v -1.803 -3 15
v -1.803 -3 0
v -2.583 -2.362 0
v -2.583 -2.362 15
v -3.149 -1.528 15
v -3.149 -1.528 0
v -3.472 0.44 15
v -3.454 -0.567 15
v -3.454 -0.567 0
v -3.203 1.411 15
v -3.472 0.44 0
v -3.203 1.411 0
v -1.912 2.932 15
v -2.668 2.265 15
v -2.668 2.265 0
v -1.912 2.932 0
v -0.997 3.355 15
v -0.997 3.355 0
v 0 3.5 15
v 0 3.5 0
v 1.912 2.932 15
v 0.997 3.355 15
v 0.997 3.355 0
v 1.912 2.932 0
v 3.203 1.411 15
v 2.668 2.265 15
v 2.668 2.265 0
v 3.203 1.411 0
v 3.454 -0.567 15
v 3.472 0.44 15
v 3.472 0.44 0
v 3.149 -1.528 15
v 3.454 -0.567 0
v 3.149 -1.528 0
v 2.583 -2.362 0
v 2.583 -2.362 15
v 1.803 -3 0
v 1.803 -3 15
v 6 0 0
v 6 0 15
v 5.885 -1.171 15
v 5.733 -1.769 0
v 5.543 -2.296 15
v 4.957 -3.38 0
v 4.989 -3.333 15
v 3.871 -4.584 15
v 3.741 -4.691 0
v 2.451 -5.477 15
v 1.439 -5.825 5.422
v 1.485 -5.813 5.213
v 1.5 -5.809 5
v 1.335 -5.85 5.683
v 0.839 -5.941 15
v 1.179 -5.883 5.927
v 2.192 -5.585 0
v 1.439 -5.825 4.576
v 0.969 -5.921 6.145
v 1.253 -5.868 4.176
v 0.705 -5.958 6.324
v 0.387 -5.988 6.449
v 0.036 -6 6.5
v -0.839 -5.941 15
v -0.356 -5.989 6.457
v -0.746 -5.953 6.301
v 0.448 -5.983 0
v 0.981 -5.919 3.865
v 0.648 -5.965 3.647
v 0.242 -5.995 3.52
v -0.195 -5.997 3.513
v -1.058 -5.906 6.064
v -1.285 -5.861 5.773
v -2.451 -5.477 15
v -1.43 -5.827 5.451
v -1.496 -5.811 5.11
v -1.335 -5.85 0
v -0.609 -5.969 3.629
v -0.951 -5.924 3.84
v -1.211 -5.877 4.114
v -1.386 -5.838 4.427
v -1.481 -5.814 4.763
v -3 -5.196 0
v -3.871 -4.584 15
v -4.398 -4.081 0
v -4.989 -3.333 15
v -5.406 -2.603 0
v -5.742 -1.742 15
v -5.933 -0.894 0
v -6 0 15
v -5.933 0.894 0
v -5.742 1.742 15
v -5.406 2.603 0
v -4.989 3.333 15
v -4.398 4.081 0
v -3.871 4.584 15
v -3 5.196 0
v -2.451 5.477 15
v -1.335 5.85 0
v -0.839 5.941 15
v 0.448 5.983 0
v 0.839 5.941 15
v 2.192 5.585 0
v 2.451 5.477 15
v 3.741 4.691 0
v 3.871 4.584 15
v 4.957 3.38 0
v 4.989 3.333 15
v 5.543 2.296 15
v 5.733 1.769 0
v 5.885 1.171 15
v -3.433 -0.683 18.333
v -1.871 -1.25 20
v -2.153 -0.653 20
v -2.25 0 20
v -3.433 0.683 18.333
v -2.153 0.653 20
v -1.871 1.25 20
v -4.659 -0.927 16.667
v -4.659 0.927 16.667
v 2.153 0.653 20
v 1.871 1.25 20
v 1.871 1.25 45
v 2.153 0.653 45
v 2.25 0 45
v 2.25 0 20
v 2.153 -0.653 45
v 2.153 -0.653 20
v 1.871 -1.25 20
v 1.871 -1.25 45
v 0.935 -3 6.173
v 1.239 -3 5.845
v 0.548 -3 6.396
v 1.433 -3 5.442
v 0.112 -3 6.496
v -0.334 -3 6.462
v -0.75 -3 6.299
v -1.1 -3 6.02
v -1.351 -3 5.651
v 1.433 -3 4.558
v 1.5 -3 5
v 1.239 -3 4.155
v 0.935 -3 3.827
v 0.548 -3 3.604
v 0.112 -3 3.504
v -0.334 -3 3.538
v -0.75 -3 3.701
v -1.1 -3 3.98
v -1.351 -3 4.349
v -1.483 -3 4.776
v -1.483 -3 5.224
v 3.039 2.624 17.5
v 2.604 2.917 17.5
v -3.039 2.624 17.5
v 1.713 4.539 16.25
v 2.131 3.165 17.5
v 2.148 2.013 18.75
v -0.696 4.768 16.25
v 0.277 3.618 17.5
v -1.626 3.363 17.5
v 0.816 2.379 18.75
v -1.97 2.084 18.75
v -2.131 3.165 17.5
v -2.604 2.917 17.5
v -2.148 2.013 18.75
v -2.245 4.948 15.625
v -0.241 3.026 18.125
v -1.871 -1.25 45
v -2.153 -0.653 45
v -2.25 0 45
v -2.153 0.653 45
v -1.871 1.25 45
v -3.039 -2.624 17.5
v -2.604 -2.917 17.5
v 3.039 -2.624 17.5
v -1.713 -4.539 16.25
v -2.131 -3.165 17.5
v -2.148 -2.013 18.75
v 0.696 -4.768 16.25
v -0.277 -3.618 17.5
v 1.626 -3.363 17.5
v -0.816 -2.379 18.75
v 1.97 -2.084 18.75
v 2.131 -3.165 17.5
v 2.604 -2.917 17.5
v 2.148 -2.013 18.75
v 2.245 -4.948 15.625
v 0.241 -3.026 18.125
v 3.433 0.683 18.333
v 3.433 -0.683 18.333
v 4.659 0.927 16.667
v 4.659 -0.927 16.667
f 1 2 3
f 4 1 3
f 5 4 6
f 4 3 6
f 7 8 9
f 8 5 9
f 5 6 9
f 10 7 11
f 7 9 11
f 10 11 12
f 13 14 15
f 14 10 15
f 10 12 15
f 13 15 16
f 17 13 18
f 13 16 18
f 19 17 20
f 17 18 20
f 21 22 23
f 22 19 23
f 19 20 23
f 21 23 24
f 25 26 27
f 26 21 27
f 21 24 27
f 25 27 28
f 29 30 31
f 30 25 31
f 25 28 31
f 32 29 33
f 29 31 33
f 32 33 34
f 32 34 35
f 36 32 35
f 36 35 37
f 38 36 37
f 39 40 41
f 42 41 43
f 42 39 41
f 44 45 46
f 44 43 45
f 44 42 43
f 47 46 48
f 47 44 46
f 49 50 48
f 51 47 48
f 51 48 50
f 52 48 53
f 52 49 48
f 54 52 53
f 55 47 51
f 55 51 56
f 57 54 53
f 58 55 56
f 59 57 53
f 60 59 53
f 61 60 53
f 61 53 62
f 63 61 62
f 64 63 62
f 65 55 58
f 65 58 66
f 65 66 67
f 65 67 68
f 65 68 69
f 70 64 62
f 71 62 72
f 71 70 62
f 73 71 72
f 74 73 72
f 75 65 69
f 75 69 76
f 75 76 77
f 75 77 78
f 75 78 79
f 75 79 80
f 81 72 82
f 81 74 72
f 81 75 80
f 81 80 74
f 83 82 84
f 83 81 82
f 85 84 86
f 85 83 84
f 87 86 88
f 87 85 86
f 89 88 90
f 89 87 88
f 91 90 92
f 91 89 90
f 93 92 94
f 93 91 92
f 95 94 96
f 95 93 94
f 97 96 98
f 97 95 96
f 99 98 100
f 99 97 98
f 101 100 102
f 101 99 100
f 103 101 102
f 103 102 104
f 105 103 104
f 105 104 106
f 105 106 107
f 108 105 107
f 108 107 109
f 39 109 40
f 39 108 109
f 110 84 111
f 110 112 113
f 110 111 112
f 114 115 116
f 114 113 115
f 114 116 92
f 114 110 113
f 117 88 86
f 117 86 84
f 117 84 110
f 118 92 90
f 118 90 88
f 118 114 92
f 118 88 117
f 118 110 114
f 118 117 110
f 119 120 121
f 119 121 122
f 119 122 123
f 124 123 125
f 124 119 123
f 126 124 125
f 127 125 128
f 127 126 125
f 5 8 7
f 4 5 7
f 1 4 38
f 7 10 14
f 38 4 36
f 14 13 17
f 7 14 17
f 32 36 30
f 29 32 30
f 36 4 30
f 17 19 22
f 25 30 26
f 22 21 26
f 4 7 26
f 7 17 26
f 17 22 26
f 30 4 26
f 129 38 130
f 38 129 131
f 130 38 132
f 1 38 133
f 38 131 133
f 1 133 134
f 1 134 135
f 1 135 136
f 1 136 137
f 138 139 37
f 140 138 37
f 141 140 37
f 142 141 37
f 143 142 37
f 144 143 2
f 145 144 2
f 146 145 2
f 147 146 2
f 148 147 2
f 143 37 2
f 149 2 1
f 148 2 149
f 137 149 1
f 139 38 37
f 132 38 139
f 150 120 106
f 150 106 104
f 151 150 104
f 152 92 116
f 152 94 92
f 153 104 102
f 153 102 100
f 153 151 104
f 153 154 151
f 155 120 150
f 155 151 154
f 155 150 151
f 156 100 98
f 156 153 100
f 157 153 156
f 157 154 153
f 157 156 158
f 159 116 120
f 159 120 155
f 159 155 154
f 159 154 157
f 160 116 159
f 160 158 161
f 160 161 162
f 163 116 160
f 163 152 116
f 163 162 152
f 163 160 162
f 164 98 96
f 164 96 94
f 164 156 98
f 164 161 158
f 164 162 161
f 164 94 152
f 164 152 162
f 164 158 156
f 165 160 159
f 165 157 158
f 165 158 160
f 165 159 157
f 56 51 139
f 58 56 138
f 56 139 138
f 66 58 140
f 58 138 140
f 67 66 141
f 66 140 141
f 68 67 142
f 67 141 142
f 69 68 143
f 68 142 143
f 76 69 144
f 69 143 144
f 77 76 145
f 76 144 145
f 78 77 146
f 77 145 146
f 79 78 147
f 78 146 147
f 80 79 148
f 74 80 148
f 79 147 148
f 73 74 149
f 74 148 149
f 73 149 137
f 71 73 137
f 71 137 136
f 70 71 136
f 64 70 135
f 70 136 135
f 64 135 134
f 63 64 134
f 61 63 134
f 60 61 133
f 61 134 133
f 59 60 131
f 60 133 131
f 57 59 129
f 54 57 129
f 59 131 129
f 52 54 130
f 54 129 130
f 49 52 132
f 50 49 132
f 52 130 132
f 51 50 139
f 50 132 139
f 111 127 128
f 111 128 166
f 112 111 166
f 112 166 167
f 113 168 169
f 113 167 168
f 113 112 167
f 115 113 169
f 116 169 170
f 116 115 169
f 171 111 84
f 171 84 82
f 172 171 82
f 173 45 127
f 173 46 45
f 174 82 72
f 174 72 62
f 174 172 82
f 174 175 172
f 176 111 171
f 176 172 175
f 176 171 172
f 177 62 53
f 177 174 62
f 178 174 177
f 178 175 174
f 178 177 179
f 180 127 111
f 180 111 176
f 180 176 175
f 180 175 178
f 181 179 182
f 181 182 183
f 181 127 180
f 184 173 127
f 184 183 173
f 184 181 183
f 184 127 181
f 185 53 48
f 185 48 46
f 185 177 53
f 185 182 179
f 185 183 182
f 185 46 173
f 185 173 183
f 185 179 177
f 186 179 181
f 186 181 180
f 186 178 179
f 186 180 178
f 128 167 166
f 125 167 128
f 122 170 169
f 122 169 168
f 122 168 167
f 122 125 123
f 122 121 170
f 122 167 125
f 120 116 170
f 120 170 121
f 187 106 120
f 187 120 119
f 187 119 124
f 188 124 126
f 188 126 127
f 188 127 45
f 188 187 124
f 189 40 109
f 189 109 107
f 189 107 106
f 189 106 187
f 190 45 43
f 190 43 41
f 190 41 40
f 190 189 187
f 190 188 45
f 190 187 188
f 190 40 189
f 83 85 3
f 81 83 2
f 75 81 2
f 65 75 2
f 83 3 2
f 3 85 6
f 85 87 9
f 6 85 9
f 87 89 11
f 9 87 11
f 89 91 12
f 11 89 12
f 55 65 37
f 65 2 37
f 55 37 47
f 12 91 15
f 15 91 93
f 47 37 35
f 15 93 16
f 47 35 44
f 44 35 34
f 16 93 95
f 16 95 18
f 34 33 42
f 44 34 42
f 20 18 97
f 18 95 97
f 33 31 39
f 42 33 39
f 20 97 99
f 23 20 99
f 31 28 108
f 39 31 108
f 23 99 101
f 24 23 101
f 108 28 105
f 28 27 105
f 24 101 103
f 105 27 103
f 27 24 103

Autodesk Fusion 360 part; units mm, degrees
sketch "Esquisse1" plane through (0, 0, 0) normal (0, 0, 1) x (1, 0, 0)
  circle A0 centre (0, 0) radius 3.5
  circle A1 centre (0, 0) radius 6
  line L0 (1.8028, -3) -> (-1.8028, -3)
  line L1 (-1.8028, -3) -> (-1.8028, -3.5)
  line L2 (-1.8028, -3.5) -> (1.8028, -3.5)
  line L3 (1.8028, -3.5) -> (1.8028, -3)
  dimension "d1" = 7
  dimension "d2" = 12
  dimension "d17" = 0.5
extrude "Extrusion1" add sketch "Esquisse1" along normal blind 15 contours A0 L0 | A0 L1 L2 | A0 L2 L3 | A1 picked at (0.4606, -3.0719)
ref_plane "Plan de construction1" through (0, 0, 20) normal (0, 0, 1) x (1, 0, 0)
sketch "Esquisse2" plane through (0, 0, 20) normal (0, 0, 1) x (1, 0, 0)
  line L0 (-1.8708, 1.25) -> (1.8708, 1.25)
  line L1 (1.8708, -1.25) -> (-1.8708, -1.25)
  arc A0 (-1.8708, 1.25) -> (-1.8708, -1.25) centre (0, 0) ccw
  arc A1 (1.8708, -1.25) -> (1.8708, 1.25) centre (0, 0) ccw
  dimension "d6" = 4.5
  dimension "d16" = 2.5
sketch "Esquisse3" plane through (0, 0, 15) normal (0, 0, 1) x (1, 0, 0)
  circle A0 centre (0, 0) radius 6
  circle A1 centre (0, 0) radius 6
  arc A2 (1.8028, -3) -> (-1.8028, -3) centre (0, 0) ccw
  line L0 (1.8028, -3) -> (-1.8028, -3)
  dimension "d13" = 12
loft "Lissage1" add profiles "Esquisse3", "Esquisse2" section 1 contours A0 A1 | A2 L0 section 2
extrude "Extrusion2" add 1 faces at (0.6236, -0.4167, 20) along direction (0, 0, 1) blind 25
sketch "Esquisse4" plane through (0, 0, 0) normal (0, 1, 0) x (1, 0, 0)
  circle A0 centre (0, -5) radius 1.5
  line L0 (0, 0) -> (0, -15) construction
  line L1 (-4.9889, -15) -> (4.9889, -15)
  dimension "d11" = 3
  dimension "d12" = 5
extrude "Extrusion3" cut sketch "Esquisse4" against normal blind 10
equation "d9 = 5 mm + 3 mm + 5 mm + 5 mm + 7 mm"
